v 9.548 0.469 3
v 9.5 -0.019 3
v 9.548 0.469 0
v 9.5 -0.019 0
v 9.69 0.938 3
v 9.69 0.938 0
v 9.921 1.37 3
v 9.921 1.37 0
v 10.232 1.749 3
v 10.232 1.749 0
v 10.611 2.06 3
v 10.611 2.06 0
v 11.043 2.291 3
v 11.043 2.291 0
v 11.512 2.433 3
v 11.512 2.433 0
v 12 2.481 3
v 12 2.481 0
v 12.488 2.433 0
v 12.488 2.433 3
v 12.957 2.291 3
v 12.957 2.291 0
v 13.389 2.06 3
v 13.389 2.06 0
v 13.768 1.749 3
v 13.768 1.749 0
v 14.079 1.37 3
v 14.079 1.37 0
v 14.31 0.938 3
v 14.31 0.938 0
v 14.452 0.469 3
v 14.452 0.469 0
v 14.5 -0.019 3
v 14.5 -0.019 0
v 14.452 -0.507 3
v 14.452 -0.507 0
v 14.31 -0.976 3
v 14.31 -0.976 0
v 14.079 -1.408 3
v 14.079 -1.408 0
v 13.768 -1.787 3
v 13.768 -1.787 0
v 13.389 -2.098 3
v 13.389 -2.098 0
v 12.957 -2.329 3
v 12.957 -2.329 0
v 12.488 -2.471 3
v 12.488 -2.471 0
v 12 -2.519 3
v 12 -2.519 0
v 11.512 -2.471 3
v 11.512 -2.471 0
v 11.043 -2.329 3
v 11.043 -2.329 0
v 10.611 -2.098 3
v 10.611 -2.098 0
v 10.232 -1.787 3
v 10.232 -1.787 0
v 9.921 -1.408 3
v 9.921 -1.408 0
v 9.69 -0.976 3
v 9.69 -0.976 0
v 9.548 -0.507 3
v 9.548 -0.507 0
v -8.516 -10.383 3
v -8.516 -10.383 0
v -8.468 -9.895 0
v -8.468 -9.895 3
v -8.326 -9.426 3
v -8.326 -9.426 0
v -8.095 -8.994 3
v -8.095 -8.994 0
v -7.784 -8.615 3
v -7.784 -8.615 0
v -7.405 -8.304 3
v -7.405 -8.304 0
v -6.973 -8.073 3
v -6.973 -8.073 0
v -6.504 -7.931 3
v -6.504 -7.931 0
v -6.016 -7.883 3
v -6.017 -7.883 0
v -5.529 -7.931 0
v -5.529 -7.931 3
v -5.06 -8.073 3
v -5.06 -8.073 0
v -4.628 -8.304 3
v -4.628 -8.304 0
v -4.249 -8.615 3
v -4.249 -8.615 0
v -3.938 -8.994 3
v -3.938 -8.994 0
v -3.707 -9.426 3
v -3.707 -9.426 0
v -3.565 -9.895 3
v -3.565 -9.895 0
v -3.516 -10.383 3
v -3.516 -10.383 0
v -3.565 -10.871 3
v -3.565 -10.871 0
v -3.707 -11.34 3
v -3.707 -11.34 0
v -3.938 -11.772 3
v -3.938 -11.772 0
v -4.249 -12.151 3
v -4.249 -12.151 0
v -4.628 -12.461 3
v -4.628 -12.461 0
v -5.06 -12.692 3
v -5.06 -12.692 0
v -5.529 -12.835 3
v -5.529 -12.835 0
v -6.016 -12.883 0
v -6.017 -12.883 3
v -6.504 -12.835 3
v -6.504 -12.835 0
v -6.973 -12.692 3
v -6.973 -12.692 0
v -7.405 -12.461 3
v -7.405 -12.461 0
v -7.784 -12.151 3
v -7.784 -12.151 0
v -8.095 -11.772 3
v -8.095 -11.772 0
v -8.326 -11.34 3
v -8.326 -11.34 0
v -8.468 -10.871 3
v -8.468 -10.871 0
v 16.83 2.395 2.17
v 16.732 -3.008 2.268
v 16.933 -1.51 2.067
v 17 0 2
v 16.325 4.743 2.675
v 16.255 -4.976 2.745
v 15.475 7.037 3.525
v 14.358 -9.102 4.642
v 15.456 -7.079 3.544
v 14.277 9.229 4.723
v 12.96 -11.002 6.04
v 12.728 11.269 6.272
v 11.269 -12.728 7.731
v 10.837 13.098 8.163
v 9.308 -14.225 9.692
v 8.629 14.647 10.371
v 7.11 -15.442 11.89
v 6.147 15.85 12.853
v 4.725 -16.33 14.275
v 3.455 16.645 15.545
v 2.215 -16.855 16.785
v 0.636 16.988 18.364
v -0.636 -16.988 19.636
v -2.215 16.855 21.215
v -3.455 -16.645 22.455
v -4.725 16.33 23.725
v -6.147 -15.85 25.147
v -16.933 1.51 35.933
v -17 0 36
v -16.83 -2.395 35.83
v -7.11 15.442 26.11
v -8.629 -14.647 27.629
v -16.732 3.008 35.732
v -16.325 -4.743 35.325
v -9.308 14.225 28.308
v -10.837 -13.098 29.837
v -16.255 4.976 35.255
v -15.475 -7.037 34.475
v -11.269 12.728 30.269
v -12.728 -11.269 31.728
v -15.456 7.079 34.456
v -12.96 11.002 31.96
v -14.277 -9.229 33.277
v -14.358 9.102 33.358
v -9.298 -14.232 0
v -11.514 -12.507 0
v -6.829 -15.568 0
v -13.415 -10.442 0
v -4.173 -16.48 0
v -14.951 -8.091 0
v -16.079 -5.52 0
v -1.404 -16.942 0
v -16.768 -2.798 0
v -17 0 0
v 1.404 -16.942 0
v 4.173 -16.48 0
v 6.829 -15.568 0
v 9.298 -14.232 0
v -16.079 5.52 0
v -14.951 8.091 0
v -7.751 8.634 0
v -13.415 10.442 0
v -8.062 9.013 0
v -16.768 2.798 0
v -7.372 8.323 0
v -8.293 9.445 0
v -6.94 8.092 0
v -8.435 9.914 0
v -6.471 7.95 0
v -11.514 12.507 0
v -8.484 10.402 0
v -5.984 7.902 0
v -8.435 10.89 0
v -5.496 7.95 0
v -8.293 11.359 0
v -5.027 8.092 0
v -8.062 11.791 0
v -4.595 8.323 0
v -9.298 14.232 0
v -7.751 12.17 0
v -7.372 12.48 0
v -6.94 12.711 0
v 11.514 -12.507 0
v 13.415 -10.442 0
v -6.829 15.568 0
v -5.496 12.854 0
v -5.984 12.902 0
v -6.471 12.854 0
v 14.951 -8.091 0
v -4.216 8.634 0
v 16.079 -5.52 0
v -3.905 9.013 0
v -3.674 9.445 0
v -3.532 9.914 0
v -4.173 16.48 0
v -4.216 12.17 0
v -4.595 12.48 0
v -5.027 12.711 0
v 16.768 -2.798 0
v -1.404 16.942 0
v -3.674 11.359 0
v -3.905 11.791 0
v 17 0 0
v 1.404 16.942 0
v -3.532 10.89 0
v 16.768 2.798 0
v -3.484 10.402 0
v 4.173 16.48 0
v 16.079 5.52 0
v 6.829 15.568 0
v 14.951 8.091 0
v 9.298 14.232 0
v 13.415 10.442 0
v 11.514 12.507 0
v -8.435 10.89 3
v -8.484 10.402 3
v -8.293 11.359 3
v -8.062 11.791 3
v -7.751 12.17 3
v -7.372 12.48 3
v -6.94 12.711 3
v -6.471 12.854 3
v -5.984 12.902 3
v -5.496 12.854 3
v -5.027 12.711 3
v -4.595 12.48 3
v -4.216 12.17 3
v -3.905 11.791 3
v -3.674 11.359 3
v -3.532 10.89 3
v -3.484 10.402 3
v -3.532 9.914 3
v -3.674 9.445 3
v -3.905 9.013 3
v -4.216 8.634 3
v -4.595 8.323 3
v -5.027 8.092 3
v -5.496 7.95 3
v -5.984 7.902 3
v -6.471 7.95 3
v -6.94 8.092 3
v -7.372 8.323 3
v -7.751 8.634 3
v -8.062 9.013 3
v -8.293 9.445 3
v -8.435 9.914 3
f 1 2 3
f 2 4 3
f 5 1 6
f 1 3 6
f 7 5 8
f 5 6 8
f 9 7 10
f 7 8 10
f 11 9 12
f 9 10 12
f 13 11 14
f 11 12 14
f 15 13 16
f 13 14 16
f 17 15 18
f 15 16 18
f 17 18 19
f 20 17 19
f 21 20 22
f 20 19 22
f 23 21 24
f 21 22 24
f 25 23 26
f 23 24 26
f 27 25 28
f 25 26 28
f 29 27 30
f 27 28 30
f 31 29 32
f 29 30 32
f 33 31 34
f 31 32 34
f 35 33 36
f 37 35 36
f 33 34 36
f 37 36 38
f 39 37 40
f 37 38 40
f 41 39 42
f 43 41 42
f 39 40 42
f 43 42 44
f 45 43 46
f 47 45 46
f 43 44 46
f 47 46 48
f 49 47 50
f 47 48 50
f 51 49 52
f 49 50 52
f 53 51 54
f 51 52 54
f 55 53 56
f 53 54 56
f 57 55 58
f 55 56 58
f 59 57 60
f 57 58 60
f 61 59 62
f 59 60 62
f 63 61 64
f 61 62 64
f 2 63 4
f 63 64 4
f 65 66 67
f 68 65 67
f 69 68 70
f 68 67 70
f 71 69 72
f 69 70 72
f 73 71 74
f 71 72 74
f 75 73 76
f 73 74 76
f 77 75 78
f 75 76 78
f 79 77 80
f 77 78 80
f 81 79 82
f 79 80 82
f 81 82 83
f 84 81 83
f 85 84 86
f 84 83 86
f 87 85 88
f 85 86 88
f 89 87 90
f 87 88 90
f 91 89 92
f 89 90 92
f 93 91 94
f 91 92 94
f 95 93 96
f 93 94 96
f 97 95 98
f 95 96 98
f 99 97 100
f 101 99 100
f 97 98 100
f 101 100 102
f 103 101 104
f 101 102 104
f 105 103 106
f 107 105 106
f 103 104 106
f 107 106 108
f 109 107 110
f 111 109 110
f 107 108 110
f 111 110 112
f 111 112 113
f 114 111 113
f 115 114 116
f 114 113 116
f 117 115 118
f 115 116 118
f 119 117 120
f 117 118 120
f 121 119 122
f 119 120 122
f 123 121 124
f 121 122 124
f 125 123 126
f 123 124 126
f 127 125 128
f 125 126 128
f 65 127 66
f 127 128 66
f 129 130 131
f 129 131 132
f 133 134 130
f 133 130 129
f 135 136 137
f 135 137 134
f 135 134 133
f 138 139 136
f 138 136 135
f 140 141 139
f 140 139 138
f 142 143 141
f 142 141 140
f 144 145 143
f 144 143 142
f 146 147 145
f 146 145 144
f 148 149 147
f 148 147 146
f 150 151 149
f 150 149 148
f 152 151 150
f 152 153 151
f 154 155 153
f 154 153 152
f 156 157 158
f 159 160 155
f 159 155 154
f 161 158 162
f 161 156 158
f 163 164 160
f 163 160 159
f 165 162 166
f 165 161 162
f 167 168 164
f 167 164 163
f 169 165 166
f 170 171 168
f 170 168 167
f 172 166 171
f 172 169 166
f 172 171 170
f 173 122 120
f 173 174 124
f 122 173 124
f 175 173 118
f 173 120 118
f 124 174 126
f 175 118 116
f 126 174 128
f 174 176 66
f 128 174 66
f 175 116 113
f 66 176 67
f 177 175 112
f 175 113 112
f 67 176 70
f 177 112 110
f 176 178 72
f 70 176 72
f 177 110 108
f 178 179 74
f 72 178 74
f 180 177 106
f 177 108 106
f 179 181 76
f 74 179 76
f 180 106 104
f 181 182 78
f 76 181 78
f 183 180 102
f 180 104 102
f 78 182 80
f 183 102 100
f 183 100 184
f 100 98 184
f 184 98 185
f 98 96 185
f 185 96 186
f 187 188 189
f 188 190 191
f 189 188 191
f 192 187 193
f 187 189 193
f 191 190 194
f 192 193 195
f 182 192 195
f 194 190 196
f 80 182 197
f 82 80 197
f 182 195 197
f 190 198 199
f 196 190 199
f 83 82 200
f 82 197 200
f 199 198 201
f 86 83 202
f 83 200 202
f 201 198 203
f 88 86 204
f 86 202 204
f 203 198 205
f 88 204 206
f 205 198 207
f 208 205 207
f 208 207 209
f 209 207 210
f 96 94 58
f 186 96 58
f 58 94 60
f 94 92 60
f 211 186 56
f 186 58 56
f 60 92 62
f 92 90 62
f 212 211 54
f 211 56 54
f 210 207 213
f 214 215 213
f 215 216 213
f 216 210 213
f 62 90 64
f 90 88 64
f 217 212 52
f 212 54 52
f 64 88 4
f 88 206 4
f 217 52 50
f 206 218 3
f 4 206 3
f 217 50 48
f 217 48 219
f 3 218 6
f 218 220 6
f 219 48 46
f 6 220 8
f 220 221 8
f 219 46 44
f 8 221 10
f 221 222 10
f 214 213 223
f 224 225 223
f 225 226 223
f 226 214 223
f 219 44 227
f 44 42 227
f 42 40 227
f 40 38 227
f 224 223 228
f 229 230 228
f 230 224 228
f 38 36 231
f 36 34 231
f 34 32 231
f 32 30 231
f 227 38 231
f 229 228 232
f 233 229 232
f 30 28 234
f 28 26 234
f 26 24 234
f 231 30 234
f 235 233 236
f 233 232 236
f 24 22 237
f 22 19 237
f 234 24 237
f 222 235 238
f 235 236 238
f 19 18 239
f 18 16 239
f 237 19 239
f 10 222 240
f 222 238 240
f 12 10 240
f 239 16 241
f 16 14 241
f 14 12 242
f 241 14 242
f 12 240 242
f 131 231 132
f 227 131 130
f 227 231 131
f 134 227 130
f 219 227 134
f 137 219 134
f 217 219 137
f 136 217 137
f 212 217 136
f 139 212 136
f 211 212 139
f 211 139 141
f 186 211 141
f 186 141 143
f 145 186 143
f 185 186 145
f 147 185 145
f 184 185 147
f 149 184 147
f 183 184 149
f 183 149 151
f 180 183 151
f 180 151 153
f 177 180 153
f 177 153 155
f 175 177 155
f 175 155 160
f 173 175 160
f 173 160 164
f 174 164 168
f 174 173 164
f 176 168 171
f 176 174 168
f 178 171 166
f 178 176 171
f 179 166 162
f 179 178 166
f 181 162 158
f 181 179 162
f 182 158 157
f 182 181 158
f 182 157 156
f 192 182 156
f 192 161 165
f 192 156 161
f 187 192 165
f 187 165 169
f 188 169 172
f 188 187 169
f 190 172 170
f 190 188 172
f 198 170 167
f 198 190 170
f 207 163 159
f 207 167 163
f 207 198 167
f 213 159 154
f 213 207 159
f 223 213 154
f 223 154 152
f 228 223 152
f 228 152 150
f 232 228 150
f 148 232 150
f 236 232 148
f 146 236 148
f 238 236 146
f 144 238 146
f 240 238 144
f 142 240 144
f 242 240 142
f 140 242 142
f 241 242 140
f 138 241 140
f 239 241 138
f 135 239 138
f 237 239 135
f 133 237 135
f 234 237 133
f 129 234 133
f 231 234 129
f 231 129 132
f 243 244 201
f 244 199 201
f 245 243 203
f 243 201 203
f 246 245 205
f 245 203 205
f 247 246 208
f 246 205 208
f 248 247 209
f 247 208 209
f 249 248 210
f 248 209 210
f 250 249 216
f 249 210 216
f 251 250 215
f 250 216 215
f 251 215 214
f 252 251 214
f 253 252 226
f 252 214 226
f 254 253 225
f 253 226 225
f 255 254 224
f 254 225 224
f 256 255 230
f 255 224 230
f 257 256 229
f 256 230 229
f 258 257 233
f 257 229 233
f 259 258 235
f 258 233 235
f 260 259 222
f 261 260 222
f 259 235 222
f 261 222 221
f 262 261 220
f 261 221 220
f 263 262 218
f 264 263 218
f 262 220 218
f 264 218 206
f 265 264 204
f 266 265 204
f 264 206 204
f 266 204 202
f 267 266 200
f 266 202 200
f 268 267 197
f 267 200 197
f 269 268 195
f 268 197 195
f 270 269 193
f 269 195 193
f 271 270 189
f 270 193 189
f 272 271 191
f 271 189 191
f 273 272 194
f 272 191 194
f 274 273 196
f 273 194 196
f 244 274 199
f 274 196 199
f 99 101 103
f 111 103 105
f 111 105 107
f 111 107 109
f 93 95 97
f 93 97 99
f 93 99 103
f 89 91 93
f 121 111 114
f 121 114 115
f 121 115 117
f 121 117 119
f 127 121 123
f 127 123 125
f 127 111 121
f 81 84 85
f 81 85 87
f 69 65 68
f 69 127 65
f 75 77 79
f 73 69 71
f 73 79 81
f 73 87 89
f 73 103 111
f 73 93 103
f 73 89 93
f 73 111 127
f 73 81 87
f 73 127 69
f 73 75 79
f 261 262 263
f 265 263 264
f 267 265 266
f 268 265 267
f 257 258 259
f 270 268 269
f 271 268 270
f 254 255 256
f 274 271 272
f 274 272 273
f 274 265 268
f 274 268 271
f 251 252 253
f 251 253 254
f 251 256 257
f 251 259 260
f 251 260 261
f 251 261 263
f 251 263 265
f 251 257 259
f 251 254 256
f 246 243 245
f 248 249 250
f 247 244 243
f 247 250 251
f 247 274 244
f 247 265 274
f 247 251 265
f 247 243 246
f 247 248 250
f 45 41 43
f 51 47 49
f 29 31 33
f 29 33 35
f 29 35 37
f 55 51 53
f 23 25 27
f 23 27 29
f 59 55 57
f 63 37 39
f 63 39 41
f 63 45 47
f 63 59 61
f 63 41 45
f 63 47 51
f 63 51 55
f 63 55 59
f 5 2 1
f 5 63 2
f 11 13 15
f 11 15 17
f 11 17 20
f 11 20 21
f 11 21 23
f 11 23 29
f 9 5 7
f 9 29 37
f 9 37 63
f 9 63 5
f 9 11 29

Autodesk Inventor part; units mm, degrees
ref_plane "YZ Plane" through (0, 0, 0) normal (1, 0, 0) x (0, 1, 0)
ref_plane "XY Plane" through (0, 0, 0) normal (0, 0, 1) x (1, 0, 0)
sketch "Sketch1" plane through (0, 0, 0) normal (0, 0, 1) x (1, 0, 0)
  circle A0 centre (0, 0) radius 17
  dimension "d0" = 34
extrude "Extrusion1" add sketch "Sketch1" along normal blind 36
sketch "Sketch2" plane through (0, 0, 0) normal (0, 1, 0) x (-1, 0, 0)
  line L0 (17, 36) -> (-17, 36) projected
  line L1 (17, 36) -> (-17.212, 1.788)
  point P0 (0, 0)
  dimension "d3" = 45
ref_plane "Work Plane1" through (-17, 0, 36) normal (0.7071, 0, 0.7071) x (0.7071, 0, -0.7071)
split "Split2" plane through (-17, 0, 36) removes the side toward (0.7071, 0, 0.7071)
sketch "Sketch3" plane through (0, 0, 0) normal (0, 0, -1) x (-1, 0, 0)
  circle A0 centre (0, 0) radius 12
  circle A1 centre (6.0165, -10.3828) radius 2.5
  circle A2 centre (5.9835, 10.4018) radius 2.5
  circle A3 centre (-12, -0.0191) radius 2.5
  dimension "d5" = 24
  dimension "d6" = 5
  dimension "d9" = 360
extrude "Extrusion2" cut sketch "Sketch3" against normal blind 3 contours A2 A0 | A0 A2 | A1 A0 | A0 A1 | A3 A0 | A0 A3
sketch "Sketch4" plane through (0, 0, 0) normal (0, 0, -1) x (-1, 0, 0)
  point P0 (0, -12)
properties part number "trzymadlo" material "ABS Plastic"
